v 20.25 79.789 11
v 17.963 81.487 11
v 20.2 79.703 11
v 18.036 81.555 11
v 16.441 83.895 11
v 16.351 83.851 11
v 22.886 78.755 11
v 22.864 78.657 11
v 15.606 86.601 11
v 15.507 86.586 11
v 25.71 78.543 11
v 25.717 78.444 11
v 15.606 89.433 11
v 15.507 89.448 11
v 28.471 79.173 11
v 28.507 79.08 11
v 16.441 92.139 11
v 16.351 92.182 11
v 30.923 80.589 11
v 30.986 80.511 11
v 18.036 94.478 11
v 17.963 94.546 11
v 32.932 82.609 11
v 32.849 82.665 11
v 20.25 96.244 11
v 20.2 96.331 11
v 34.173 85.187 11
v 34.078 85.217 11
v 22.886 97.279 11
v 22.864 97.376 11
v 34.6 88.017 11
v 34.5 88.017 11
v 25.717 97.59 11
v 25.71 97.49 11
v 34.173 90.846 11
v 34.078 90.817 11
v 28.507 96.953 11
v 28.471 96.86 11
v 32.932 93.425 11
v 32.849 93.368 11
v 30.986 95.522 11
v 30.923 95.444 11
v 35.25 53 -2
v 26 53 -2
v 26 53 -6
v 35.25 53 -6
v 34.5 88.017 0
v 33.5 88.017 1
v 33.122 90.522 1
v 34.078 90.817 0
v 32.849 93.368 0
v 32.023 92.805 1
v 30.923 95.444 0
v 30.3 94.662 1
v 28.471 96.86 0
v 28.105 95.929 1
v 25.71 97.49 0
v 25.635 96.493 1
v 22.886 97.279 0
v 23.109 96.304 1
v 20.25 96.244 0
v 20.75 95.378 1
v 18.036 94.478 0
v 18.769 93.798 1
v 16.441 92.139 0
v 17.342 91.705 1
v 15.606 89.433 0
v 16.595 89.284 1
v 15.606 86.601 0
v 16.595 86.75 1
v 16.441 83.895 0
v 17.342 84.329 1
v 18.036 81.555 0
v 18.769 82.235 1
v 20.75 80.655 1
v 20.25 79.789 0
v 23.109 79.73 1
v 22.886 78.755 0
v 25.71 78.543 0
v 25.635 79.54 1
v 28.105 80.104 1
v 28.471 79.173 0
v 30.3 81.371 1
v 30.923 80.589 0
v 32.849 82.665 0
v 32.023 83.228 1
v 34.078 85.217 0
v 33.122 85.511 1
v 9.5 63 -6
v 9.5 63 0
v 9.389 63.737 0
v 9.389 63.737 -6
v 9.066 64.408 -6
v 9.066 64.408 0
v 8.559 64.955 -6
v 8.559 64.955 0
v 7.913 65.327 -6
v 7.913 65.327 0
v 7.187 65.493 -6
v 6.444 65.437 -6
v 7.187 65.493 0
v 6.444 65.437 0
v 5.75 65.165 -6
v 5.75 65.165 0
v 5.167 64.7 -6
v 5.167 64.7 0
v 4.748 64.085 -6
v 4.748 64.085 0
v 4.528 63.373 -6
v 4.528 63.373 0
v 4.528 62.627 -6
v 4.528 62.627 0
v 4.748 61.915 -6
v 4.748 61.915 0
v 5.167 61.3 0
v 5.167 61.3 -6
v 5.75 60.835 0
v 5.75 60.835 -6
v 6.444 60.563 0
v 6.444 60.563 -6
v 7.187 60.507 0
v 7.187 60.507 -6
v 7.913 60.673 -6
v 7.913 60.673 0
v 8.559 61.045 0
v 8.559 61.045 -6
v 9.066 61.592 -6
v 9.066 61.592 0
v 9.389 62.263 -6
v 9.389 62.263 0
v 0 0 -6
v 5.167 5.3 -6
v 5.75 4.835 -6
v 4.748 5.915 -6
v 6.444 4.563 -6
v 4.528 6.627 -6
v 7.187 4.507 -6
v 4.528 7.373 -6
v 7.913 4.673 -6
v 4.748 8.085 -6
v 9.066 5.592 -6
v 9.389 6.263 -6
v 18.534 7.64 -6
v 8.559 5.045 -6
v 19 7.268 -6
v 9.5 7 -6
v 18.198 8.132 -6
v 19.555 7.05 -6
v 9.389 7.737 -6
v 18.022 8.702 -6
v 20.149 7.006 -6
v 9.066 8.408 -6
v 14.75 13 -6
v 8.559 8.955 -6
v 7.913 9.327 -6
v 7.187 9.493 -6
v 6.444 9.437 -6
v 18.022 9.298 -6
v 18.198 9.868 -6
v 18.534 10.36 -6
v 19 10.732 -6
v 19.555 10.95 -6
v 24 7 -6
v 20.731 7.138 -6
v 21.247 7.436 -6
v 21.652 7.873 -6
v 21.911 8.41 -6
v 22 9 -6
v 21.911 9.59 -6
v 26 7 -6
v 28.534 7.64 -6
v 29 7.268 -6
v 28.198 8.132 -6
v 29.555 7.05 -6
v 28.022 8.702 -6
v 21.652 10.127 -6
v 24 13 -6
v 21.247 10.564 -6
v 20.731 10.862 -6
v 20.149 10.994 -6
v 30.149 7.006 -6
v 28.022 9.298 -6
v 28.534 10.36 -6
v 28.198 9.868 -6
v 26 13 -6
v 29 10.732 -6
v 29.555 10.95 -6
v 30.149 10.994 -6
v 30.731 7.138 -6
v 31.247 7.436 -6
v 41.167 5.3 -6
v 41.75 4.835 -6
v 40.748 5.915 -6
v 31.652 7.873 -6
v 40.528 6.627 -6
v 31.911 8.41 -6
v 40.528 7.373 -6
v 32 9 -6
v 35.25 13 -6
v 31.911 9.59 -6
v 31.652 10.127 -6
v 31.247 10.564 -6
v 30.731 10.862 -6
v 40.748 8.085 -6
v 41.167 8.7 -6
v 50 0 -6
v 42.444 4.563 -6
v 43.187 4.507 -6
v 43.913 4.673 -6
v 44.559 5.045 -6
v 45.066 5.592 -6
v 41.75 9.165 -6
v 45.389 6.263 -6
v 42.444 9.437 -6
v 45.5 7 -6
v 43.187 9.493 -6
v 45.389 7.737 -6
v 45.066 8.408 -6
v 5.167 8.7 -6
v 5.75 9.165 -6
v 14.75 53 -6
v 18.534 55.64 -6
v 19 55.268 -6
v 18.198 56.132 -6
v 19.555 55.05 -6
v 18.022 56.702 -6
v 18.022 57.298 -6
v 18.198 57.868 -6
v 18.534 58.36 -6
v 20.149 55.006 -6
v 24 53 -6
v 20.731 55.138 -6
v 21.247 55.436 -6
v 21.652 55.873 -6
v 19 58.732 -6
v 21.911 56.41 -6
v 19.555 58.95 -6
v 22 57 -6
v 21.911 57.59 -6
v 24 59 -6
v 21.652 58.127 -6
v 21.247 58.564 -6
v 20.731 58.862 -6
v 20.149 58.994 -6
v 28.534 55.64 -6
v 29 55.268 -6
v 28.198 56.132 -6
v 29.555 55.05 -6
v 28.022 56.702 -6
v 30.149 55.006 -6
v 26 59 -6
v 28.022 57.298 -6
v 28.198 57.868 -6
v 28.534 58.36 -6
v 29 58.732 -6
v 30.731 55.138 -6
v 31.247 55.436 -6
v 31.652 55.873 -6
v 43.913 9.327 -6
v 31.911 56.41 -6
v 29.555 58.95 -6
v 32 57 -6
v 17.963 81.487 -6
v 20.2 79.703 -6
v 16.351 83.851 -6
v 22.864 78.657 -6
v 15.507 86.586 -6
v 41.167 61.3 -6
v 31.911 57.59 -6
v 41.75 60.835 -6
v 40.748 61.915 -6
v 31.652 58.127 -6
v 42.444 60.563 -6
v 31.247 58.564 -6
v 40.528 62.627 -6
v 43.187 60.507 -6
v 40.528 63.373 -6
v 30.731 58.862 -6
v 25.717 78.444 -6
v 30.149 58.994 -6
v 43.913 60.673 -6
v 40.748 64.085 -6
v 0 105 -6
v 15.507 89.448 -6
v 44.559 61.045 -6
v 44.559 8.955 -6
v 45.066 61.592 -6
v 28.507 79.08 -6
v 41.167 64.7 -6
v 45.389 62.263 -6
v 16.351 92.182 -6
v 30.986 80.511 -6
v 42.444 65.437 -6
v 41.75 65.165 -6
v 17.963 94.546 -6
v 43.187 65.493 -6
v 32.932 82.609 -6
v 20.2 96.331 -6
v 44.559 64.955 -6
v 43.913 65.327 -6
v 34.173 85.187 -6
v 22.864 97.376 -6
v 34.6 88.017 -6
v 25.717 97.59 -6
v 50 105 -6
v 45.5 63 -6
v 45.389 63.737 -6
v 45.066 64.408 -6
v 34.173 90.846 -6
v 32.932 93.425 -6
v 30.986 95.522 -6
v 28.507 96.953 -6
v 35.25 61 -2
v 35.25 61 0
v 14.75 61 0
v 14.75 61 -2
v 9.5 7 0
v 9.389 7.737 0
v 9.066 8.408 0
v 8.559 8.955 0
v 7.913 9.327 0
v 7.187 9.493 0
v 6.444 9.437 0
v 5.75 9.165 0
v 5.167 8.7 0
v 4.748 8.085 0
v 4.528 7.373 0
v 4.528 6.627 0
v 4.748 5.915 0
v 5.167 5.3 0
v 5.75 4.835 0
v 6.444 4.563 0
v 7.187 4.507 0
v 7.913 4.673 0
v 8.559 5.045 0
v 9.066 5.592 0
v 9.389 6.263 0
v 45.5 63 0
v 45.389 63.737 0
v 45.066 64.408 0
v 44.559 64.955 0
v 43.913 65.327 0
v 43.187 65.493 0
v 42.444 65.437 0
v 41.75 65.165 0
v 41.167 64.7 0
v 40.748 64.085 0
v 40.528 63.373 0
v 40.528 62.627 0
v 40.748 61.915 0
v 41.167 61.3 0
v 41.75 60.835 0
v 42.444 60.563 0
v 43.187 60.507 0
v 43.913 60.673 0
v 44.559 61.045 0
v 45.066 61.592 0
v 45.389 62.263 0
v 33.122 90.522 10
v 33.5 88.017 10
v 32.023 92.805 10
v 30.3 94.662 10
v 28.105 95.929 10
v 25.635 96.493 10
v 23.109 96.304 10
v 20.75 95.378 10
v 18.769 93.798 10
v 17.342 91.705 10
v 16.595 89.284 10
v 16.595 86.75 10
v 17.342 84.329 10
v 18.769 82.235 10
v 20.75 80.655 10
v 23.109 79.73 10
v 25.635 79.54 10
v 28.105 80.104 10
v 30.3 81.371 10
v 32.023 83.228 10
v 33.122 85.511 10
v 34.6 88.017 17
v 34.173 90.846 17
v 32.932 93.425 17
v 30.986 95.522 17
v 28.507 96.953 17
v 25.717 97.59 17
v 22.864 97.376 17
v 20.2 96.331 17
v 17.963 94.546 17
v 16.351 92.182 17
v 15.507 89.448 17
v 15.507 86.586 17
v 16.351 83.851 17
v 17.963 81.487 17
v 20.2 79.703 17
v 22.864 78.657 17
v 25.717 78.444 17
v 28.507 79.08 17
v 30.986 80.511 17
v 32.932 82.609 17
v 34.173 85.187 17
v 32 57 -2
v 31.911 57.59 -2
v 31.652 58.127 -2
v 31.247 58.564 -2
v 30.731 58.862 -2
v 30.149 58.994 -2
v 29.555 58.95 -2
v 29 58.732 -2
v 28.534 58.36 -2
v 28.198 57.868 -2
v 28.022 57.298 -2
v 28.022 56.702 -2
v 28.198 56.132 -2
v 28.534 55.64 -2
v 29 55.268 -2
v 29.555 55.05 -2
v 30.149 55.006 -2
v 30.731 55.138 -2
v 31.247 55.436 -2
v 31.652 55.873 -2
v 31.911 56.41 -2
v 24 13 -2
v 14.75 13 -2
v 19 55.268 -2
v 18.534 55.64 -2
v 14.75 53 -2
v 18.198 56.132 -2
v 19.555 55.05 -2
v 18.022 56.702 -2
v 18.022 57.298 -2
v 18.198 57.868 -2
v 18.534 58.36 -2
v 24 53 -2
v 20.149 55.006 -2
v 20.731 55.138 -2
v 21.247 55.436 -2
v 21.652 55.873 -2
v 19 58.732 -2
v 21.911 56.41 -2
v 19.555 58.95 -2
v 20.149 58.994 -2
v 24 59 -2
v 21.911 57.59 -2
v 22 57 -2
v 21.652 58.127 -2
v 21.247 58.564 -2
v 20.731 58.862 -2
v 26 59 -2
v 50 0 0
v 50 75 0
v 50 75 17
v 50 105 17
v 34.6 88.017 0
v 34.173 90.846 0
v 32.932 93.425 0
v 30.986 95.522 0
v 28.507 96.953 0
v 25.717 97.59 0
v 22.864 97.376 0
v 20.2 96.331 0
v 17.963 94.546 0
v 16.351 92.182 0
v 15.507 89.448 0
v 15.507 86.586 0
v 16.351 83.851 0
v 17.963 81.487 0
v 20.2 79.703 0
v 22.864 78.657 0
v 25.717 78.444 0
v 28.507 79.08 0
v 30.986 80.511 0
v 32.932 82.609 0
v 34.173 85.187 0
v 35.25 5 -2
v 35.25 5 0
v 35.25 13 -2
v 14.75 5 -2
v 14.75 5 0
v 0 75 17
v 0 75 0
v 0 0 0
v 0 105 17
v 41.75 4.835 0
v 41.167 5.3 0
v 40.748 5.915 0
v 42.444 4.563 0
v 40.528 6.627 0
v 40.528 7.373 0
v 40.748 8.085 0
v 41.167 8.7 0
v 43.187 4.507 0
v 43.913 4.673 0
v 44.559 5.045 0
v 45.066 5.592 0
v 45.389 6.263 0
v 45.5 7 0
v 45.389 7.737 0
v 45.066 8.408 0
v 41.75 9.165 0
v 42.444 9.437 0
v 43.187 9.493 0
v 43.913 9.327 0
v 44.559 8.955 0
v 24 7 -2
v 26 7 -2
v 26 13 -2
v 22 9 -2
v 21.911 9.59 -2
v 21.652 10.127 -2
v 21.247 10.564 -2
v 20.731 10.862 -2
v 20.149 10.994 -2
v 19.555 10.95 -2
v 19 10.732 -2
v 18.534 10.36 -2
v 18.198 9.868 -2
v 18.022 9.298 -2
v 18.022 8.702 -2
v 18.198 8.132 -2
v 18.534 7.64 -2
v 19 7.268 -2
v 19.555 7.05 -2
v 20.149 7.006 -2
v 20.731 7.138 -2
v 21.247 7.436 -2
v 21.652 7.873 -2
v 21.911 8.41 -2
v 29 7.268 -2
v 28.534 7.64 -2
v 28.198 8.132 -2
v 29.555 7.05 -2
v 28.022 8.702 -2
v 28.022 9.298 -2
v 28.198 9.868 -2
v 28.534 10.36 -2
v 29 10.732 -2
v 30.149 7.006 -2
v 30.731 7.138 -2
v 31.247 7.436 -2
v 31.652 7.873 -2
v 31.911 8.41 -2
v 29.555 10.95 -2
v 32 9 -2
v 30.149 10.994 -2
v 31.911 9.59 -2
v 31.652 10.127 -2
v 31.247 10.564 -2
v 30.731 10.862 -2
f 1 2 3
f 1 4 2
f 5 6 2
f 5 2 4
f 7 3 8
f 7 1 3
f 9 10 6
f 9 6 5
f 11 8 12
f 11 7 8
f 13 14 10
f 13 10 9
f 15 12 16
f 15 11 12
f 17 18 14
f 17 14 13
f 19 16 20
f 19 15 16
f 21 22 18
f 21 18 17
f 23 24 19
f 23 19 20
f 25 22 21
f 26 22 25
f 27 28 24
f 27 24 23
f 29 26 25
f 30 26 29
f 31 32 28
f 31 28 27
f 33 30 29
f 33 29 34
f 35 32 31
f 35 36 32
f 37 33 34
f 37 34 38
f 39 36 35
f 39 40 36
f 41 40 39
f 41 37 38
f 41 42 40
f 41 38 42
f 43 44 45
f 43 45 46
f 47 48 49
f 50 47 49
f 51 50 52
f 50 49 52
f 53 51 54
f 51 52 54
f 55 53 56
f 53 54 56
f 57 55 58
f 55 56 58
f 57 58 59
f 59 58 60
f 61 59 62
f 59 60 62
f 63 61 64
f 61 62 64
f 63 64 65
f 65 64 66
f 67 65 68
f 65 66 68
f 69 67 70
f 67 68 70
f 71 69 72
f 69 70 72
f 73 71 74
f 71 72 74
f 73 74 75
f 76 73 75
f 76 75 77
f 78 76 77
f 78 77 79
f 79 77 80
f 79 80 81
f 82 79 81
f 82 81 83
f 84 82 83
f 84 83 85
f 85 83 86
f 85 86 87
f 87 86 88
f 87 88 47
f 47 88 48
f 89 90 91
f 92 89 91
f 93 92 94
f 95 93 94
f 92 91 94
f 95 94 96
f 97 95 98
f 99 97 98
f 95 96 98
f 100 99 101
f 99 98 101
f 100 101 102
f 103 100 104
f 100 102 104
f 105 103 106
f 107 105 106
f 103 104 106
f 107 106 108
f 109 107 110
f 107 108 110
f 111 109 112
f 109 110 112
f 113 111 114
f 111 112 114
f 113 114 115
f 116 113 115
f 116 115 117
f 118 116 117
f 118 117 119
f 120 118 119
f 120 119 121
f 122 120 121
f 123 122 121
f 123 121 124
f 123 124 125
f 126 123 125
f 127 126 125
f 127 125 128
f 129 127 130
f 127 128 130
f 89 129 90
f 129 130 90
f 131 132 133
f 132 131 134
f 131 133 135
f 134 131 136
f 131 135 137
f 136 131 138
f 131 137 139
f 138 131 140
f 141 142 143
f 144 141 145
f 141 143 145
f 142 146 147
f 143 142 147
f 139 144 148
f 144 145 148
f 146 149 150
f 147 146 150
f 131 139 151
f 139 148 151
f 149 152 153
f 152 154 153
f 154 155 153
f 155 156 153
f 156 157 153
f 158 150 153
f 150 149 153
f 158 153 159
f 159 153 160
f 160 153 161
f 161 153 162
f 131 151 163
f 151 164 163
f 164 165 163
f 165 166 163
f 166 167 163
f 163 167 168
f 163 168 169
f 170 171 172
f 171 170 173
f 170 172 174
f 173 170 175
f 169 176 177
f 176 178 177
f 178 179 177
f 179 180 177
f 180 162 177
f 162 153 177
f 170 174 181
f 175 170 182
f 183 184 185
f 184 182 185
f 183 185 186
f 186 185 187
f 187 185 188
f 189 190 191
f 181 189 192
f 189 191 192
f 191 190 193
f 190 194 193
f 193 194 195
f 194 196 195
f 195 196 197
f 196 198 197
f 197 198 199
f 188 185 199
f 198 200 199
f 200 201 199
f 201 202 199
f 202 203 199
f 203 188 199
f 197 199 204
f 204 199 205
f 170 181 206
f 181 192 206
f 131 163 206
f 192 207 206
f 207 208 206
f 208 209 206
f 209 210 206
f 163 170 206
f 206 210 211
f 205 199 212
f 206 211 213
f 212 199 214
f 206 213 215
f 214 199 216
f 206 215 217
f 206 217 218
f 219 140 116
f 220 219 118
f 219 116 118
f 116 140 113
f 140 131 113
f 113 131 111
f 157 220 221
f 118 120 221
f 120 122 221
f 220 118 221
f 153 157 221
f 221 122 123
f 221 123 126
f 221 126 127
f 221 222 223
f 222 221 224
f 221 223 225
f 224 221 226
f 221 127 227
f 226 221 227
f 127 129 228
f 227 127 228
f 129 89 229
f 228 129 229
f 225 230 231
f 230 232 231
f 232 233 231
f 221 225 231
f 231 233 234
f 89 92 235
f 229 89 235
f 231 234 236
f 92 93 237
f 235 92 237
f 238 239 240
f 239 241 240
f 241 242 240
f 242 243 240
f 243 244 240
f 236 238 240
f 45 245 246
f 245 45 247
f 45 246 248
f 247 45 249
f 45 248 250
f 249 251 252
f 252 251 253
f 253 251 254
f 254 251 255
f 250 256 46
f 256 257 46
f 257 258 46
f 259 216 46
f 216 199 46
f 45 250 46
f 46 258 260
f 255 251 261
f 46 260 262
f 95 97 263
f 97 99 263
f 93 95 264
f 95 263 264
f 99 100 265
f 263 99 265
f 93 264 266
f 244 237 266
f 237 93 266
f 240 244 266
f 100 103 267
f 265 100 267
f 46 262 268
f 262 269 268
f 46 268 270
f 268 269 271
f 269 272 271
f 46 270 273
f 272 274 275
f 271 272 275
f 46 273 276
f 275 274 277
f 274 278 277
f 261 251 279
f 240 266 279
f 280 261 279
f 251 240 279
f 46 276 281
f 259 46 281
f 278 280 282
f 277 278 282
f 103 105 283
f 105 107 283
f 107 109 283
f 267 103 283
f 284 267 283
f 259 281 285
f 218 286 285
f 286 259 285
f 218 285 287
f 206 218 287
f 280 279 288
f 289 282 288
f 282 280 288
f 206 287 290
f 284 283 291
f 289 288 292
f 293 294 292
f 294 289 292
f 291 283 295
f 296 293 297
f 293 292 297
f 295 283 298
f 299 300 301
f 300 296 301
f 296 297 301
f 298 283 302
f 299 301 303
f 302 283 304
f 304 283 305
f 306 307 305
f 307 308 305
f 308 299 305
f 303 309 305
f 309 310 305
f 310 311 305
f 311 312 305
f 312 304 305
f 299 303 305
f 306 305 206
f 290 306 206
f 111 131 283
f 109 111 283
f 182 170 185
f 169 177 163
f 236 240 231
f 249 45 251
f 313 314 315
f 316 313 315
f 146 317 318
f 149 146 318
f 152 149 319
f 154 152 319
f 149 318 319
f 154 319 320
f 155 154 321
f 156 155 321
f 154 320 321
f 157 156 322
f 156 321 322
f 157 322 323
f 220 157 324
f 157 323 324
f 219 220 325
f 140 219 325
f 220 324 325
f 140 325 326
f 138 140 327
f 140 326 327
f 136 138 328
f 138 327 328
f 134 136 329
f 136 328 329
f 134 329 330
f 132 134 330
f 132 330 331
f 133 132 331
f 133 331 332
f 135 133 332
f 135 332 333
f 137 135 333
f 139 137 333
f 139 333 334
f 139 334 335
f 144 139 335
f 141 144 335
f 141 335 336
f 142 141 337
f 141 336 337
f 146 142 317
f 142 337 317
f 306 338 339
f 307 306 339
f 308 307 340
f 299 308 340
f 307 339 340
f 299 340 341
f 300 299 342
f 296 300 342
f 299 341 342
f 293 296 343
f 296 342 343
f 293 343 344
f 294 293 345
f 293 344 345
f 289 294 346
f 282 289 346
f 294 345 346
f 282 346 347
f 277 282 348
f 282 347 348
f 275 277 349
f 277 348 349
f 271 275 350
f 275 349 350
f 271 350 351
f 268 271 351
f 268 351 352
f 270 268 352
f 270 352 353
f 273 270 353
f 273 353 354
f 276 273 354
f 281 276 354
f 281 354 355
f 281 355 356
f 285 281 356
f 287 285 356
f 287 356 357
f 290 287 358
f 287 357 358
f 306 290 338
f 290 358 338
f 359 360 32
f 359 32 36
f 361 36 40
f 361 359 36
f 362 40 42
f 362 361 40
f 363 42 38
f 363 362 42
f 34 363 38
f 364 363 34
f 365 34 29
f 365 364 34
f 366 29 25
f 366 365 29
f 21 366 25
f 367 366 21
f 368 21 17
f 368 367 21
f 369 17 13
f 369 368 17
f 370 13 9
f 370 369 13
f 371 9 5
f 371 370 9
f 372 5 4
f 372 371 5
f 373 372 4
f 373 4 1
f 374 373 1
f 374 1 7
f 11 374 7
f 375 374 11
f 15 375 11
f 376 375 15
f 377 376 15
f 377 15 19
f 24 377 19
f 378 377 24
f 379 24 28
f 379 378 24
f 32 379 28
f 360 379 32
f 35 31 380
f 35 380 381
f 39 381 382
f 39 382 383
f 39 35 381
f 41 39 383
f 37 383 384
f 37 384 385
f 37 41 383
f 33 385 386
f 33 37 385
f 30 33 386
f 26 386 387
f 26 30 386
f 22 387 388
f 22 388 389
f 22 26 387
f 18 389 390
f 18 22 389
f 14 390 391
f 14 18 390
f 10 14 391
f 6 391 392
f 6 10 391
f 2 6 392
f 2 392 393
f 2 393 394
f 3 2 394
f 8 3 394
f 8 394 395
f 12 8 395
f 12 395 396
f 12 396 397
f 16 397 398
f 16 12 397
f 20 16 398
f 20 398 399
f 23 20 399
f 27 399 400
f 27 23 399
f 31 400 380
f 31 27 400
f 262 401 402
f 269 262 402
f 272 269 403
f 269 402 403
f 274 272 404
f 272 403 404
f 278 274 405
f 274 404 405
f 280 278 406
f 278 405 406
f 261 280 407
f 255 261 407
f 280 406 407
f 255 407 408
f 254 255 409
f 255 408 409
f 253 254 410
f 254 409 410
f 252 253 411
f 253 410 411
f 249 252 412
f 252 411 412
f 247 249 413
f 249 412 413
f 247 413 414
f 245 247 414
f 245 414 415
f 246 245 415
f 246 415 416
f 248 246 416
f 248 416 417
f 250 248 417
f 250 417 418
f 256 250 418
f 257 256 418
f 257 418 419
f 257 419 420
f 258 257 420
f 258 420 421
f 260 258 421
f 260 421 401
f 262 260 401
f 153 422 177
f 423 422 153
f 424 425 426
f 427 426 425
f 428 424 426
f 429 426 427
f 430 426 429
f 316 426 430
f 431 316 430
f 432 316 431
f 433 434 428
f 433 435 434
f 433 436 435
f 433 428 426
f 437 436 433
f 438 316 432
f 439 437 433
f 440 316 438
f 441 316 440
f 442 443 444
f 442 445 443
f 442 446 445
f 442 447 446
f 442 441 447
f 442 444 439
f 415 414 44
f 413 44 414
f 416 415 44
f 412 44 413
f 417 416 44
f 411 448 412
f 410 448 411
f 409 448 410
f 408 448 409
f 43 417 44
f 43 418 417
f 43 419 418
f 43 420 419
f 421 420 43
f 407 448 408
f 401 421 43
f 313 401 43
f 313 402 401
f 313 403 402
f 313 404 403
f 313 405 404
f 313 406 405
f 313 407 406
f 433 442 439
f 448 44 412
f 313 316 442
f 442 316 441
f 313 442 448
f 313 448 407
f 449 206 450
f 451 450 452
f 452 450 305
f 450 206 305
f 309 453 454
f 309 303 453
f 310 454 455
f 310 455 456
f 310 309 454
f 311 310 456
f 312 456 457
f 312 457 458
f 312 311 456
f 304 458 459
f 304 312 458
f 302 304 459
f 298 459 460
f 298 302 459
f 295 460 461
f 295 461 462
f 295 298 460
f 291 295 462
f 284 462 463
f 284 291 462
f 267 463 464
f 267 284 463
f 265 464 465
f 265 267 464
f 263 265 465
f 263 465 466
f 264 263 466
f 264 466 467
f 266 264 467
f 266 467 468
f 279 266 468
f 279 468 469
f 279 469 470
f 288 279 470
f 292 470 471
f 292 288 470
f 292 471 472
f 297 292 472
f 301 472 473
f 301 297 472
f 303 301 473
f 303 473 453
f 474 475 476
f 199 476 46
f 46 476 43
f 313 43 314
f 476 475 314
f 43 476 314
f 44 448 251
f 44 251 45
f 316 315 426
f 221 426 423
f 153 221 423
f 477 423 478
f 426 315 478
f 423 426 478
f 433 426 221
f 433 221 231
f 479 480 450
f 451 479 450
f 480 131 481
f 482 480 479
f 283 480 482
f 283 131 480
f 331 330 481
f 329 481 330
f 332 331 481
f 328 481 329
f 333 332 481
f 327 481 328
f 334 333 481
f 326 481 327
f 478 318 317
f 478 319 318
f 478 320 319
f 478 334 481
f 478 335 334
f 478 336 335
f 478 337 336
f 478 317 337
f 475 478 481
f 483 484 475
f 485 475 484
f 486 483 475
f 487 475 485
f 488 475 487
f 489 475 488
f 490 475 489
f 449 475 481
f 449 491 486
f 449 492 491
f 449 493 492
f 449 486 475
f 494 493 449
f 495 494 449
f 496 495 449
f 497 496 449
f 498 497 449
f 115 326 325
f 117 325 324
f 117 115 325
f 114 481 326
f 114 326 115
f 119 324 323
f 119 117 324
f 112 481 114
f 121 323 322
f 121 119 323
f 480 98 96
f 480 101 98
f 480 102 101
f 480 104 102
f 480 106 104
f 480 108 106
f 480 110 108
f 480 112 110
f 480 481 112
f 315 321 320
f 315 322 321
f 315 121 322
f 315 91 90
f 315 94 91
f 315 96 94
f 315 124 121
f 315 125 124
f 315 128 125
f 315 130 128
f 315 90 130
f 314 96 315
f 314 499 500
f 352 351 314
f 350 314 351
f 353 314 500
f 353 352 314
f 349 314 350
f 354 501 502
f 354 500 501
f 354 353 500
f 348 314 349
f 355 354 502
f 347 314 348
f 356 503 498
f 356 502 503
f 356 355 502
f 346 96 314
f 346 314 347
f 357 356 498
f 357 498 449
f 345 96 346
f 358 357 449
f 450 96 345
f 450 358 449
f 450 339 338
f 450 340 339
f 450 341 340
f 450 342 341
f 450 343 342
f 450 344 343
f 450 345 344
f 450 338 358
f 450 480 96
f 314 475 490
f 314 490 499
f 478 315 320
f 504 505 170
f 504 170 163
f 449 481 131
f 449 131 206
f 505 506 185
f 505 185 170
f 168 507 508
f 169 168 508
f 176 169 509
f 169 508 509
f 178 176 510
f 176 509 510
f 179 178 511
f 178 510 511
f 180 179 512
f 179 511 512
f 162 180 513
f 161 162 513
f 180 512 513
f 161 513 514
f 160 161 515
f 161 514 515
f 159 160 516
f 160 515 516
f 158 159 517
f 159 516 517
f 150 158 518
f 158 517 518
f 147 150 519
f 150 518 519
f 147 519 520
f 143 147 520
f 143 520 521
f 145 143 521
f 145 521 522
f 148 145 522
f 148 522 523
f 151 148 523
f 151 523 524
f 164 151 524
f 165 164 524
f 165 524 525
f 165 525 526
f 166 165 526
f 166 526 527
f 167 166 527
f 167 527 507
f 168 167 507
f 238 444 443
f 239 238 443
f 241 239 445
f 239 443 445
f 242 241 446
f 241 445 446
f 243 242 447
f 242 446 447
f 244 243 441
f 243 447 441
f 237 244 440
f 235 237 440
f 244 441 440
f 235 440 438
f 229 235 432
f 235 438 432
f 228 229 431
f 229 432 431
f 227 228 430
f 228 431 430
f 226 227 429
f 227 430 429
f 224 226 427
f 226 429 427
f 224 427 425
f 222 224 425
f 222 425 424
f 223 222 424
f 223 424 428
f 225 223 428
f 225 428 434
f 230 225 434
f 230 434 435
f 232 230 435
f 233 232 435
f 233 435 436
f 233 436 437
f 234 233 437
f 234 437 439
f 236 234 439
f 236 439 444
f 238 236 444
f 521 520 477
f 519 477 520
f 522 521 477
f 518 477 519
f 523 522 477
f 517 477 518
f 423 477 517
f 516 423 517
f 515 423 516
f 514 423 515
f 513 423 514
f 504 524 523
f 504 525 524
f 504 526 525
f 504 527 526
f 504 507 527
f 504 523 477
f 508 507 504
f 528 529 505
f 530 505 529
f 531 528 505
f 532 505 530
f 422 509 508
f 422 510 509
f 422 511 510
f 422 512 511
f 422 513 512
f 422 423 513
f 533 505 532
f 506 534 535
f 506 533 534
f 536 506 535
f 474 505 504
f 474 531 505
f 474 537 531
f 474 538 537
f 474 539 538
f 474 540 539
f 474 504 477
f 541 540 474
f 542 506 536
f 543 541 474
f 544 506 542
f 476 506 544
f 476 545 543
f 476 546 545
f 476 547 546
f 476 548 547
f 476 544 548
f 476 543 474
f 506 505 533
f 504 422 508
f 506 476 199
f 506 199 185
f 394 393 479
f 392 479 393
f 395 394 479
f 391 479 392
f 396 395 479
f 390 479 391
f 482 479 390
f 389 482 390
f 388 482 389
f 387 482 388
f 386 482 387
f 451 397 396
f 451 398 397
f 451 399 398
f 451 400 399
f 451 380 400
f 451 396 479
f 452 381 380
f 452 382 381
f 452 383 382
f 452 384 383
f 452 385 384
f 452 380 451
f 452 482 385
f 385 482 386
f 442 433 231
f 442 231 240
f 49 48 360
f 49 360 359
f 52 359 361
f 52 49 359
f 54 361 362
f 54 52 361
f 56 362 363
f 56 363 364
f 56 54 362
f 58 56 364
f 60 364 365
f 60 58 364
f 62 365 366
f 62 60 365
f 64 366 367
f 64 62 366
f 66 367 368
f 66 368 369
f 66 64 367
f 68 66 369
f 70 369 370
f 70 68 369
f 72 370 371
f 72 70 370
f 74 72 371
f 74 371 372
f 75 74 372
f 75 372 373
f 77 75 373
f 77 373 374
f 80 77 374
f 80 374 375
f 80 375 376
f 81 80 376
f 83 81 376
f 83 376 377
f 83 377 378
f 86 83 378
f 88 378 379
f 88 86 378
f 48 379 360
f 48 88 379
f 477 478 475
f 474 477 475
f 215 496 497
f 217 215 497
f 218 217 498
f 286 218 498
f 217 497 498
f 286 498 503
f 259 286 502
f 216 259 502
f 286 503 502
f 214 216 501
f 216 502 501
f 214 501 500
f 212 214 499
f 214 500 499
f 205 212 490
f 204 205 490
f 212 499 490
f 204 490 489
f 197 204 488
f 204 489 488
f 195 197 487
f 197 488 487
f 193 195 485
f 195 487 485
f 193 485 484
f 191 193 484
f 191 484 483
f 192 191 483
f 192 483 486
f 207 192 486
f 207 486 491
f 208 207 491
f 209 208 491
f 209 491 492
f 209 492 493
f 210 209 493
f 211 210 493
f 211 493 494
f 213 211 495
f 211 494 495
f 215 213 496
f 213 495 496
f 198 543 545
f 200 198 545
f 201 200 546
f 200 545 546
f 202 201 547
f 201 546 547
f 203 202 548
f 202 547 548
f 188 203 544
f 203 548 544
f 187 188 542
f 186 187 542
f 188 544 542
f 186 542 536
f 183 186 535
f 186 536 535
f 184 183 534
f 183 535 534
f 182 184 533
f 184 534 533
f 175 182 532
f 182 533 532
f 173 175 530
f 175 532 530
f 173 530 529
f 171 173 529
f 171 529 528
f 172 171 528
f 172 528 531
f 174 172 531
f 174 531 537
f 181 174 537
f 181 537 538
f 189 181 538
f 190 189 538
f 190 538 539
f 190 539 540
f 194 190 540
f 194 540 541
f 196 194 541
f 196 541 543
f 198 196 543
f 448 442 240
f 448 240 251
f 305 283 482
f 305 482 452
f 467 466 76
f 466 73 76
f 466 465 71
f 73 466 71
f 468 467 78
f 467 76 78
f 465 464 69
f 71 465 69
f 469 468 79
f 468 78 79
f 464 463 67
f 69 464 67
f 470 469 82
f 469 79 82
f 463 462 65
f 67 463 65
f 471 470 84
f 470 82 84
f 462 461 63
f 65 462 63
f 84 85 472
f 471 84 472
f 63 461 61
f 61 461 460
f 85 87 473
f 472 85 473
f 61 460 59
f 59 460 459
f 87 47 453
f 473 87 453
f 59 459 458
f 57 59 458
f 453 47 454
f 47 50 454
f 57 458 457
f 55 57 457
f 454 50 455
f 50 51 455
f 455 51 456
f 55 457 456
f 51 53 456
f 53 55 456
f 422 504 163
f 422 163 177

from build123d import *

# Parameters (mm, degrees)
F0_W     = 50
F0_H     = 75
F0_R     = 2.5
F0_R_2   = 2
F0_H_2   = 30
F0_R_3   = 9.6
F1_DEPTH = 6
F2_DEPTH = 2
F3_DEPTH = 17
F0_R_4   = 8.5
F4_DEPTH = 11
F5_SIZE  = 1


with BuildPart() as f1:
    # F0 (on Top) → F1 (new body)
    with BuildSketch(Plane.XY):
        with Locations((25, 37.5)):
            Rectangle(F0_W, F0_H)
        with Locations((7, 7)):
            Circle(F0_R, mode=Mode.SUBTRACT)
        with Locations((43, 7)):
            Circle(F0_R, mode=Mode.SUBTRACT)
        Polygon((35.25, 5), (14.75, 5), (14.75, 13), (14.75, 53), (14.75, 61), (35.25, 61), (35.25, 53), (35.25, 13), align=None, mode=Mode.SUBTRACT)
        with Locations((7, 63)):
            Circle(F0_R, mode=Mode.SUBTRACT)
        with Locations((43, 63)):
            Circle(F0_R, mode=Mode.SUBTRACT)
        Polygon((14.75, 61), (14.75, 53), (24, 53), (24, 59), (26, 59), (26, 53), (35.25, 53), (35.25, 61), align=None)
        with Locations((20, 57)):
            Circle(F0_R_2, mode=Mode.SUBTRACT)
        with Locations((30, 57)):
            Circle(F0_R_2, mode=Mode.SUBTRACT)
        Polygon((14.75, 13), (14.75, 5), (35.25, 5), (35.25, 13), (26, 13), (26, 7), (24, 7), (24, 13), align=None)
        with Locations((20, 9)):
            Circle(F0_R_2, mode=Mode.SUBTRACT)
        with Locations((30, 9)):
            Circle(F0_R_2, mode=Mode.SUBTRACT)
        with Locations((25, 90)):
            Rectangle(F0_W, F0_H_2)
        with Locations((25, 88.0167)):
            Circle(F0_R_3, mode=Mode.SUBTRACT)
    extrude(amount=-F1_DEPTH)

    # F0 (on Top) → F2 (cut)
    with BuildSketch(Plane.XY):
        Polygon((14.75, 61), (14.75, 53), (24, 53), (24, 59), (26, 59), (26, 53), (35.25, 53), (35.25, 61), align=None)
        with Locations((20, 57)):
            Circle(F0_R_2, mode=Mode.SUBTRACT)
        with Locations((30, 57)):
            Circle(F0_R_2, mode=Mode.SUBTRACT)
        Polygon((14.75, 13), (14.75, 5), (35.25, 5), (35.25, 13), (26, 13), (26, 7), (24, 7), (24, 13), align=None)
        with Locations((20, 9)):
            Circle(F0_R_2, mode=Mode.SUBTRACT)
        with Locations((30, 9)):
            Circle(F0_R_2, mode=Mode.SUBTRACT)
    extrude(amount=-F2_DEPTH, mode=Mode.SUBTRACT)

    # F0 (on Top) → F3 (join)
    with BuildSketch(Plane.XY):
        with Locations((25, 90)):
            Rectangle(F0_W, F0_H_2)
        with Locations((25, 88.0167)):
            Circle(F0_R_3, mode=Mode.SUBTRACT)
    extrude(amount=F3_DEPTH)

    # F0 (on Top) → F4 (join)
    with BuildSketch(Plane.XY):
        with Locations((25, 88.0167)):
            Circle(F0_R_3)
        with Locations((25, 88.0167)):
            Circle(F0_R_4, mode=Mode.SUBTRACT)
    extrude(amount=F4_DEPTH)

    # F5
    f5_edges = [f1.edges().sort_by_distance(p)[0] for p in [
        (16.5, 88.0167, 11),
        (16.5, 88.0167, 0),
    ]]
    chamfer(f5_edges, length=F5_SIZE)


solid = f1.part
